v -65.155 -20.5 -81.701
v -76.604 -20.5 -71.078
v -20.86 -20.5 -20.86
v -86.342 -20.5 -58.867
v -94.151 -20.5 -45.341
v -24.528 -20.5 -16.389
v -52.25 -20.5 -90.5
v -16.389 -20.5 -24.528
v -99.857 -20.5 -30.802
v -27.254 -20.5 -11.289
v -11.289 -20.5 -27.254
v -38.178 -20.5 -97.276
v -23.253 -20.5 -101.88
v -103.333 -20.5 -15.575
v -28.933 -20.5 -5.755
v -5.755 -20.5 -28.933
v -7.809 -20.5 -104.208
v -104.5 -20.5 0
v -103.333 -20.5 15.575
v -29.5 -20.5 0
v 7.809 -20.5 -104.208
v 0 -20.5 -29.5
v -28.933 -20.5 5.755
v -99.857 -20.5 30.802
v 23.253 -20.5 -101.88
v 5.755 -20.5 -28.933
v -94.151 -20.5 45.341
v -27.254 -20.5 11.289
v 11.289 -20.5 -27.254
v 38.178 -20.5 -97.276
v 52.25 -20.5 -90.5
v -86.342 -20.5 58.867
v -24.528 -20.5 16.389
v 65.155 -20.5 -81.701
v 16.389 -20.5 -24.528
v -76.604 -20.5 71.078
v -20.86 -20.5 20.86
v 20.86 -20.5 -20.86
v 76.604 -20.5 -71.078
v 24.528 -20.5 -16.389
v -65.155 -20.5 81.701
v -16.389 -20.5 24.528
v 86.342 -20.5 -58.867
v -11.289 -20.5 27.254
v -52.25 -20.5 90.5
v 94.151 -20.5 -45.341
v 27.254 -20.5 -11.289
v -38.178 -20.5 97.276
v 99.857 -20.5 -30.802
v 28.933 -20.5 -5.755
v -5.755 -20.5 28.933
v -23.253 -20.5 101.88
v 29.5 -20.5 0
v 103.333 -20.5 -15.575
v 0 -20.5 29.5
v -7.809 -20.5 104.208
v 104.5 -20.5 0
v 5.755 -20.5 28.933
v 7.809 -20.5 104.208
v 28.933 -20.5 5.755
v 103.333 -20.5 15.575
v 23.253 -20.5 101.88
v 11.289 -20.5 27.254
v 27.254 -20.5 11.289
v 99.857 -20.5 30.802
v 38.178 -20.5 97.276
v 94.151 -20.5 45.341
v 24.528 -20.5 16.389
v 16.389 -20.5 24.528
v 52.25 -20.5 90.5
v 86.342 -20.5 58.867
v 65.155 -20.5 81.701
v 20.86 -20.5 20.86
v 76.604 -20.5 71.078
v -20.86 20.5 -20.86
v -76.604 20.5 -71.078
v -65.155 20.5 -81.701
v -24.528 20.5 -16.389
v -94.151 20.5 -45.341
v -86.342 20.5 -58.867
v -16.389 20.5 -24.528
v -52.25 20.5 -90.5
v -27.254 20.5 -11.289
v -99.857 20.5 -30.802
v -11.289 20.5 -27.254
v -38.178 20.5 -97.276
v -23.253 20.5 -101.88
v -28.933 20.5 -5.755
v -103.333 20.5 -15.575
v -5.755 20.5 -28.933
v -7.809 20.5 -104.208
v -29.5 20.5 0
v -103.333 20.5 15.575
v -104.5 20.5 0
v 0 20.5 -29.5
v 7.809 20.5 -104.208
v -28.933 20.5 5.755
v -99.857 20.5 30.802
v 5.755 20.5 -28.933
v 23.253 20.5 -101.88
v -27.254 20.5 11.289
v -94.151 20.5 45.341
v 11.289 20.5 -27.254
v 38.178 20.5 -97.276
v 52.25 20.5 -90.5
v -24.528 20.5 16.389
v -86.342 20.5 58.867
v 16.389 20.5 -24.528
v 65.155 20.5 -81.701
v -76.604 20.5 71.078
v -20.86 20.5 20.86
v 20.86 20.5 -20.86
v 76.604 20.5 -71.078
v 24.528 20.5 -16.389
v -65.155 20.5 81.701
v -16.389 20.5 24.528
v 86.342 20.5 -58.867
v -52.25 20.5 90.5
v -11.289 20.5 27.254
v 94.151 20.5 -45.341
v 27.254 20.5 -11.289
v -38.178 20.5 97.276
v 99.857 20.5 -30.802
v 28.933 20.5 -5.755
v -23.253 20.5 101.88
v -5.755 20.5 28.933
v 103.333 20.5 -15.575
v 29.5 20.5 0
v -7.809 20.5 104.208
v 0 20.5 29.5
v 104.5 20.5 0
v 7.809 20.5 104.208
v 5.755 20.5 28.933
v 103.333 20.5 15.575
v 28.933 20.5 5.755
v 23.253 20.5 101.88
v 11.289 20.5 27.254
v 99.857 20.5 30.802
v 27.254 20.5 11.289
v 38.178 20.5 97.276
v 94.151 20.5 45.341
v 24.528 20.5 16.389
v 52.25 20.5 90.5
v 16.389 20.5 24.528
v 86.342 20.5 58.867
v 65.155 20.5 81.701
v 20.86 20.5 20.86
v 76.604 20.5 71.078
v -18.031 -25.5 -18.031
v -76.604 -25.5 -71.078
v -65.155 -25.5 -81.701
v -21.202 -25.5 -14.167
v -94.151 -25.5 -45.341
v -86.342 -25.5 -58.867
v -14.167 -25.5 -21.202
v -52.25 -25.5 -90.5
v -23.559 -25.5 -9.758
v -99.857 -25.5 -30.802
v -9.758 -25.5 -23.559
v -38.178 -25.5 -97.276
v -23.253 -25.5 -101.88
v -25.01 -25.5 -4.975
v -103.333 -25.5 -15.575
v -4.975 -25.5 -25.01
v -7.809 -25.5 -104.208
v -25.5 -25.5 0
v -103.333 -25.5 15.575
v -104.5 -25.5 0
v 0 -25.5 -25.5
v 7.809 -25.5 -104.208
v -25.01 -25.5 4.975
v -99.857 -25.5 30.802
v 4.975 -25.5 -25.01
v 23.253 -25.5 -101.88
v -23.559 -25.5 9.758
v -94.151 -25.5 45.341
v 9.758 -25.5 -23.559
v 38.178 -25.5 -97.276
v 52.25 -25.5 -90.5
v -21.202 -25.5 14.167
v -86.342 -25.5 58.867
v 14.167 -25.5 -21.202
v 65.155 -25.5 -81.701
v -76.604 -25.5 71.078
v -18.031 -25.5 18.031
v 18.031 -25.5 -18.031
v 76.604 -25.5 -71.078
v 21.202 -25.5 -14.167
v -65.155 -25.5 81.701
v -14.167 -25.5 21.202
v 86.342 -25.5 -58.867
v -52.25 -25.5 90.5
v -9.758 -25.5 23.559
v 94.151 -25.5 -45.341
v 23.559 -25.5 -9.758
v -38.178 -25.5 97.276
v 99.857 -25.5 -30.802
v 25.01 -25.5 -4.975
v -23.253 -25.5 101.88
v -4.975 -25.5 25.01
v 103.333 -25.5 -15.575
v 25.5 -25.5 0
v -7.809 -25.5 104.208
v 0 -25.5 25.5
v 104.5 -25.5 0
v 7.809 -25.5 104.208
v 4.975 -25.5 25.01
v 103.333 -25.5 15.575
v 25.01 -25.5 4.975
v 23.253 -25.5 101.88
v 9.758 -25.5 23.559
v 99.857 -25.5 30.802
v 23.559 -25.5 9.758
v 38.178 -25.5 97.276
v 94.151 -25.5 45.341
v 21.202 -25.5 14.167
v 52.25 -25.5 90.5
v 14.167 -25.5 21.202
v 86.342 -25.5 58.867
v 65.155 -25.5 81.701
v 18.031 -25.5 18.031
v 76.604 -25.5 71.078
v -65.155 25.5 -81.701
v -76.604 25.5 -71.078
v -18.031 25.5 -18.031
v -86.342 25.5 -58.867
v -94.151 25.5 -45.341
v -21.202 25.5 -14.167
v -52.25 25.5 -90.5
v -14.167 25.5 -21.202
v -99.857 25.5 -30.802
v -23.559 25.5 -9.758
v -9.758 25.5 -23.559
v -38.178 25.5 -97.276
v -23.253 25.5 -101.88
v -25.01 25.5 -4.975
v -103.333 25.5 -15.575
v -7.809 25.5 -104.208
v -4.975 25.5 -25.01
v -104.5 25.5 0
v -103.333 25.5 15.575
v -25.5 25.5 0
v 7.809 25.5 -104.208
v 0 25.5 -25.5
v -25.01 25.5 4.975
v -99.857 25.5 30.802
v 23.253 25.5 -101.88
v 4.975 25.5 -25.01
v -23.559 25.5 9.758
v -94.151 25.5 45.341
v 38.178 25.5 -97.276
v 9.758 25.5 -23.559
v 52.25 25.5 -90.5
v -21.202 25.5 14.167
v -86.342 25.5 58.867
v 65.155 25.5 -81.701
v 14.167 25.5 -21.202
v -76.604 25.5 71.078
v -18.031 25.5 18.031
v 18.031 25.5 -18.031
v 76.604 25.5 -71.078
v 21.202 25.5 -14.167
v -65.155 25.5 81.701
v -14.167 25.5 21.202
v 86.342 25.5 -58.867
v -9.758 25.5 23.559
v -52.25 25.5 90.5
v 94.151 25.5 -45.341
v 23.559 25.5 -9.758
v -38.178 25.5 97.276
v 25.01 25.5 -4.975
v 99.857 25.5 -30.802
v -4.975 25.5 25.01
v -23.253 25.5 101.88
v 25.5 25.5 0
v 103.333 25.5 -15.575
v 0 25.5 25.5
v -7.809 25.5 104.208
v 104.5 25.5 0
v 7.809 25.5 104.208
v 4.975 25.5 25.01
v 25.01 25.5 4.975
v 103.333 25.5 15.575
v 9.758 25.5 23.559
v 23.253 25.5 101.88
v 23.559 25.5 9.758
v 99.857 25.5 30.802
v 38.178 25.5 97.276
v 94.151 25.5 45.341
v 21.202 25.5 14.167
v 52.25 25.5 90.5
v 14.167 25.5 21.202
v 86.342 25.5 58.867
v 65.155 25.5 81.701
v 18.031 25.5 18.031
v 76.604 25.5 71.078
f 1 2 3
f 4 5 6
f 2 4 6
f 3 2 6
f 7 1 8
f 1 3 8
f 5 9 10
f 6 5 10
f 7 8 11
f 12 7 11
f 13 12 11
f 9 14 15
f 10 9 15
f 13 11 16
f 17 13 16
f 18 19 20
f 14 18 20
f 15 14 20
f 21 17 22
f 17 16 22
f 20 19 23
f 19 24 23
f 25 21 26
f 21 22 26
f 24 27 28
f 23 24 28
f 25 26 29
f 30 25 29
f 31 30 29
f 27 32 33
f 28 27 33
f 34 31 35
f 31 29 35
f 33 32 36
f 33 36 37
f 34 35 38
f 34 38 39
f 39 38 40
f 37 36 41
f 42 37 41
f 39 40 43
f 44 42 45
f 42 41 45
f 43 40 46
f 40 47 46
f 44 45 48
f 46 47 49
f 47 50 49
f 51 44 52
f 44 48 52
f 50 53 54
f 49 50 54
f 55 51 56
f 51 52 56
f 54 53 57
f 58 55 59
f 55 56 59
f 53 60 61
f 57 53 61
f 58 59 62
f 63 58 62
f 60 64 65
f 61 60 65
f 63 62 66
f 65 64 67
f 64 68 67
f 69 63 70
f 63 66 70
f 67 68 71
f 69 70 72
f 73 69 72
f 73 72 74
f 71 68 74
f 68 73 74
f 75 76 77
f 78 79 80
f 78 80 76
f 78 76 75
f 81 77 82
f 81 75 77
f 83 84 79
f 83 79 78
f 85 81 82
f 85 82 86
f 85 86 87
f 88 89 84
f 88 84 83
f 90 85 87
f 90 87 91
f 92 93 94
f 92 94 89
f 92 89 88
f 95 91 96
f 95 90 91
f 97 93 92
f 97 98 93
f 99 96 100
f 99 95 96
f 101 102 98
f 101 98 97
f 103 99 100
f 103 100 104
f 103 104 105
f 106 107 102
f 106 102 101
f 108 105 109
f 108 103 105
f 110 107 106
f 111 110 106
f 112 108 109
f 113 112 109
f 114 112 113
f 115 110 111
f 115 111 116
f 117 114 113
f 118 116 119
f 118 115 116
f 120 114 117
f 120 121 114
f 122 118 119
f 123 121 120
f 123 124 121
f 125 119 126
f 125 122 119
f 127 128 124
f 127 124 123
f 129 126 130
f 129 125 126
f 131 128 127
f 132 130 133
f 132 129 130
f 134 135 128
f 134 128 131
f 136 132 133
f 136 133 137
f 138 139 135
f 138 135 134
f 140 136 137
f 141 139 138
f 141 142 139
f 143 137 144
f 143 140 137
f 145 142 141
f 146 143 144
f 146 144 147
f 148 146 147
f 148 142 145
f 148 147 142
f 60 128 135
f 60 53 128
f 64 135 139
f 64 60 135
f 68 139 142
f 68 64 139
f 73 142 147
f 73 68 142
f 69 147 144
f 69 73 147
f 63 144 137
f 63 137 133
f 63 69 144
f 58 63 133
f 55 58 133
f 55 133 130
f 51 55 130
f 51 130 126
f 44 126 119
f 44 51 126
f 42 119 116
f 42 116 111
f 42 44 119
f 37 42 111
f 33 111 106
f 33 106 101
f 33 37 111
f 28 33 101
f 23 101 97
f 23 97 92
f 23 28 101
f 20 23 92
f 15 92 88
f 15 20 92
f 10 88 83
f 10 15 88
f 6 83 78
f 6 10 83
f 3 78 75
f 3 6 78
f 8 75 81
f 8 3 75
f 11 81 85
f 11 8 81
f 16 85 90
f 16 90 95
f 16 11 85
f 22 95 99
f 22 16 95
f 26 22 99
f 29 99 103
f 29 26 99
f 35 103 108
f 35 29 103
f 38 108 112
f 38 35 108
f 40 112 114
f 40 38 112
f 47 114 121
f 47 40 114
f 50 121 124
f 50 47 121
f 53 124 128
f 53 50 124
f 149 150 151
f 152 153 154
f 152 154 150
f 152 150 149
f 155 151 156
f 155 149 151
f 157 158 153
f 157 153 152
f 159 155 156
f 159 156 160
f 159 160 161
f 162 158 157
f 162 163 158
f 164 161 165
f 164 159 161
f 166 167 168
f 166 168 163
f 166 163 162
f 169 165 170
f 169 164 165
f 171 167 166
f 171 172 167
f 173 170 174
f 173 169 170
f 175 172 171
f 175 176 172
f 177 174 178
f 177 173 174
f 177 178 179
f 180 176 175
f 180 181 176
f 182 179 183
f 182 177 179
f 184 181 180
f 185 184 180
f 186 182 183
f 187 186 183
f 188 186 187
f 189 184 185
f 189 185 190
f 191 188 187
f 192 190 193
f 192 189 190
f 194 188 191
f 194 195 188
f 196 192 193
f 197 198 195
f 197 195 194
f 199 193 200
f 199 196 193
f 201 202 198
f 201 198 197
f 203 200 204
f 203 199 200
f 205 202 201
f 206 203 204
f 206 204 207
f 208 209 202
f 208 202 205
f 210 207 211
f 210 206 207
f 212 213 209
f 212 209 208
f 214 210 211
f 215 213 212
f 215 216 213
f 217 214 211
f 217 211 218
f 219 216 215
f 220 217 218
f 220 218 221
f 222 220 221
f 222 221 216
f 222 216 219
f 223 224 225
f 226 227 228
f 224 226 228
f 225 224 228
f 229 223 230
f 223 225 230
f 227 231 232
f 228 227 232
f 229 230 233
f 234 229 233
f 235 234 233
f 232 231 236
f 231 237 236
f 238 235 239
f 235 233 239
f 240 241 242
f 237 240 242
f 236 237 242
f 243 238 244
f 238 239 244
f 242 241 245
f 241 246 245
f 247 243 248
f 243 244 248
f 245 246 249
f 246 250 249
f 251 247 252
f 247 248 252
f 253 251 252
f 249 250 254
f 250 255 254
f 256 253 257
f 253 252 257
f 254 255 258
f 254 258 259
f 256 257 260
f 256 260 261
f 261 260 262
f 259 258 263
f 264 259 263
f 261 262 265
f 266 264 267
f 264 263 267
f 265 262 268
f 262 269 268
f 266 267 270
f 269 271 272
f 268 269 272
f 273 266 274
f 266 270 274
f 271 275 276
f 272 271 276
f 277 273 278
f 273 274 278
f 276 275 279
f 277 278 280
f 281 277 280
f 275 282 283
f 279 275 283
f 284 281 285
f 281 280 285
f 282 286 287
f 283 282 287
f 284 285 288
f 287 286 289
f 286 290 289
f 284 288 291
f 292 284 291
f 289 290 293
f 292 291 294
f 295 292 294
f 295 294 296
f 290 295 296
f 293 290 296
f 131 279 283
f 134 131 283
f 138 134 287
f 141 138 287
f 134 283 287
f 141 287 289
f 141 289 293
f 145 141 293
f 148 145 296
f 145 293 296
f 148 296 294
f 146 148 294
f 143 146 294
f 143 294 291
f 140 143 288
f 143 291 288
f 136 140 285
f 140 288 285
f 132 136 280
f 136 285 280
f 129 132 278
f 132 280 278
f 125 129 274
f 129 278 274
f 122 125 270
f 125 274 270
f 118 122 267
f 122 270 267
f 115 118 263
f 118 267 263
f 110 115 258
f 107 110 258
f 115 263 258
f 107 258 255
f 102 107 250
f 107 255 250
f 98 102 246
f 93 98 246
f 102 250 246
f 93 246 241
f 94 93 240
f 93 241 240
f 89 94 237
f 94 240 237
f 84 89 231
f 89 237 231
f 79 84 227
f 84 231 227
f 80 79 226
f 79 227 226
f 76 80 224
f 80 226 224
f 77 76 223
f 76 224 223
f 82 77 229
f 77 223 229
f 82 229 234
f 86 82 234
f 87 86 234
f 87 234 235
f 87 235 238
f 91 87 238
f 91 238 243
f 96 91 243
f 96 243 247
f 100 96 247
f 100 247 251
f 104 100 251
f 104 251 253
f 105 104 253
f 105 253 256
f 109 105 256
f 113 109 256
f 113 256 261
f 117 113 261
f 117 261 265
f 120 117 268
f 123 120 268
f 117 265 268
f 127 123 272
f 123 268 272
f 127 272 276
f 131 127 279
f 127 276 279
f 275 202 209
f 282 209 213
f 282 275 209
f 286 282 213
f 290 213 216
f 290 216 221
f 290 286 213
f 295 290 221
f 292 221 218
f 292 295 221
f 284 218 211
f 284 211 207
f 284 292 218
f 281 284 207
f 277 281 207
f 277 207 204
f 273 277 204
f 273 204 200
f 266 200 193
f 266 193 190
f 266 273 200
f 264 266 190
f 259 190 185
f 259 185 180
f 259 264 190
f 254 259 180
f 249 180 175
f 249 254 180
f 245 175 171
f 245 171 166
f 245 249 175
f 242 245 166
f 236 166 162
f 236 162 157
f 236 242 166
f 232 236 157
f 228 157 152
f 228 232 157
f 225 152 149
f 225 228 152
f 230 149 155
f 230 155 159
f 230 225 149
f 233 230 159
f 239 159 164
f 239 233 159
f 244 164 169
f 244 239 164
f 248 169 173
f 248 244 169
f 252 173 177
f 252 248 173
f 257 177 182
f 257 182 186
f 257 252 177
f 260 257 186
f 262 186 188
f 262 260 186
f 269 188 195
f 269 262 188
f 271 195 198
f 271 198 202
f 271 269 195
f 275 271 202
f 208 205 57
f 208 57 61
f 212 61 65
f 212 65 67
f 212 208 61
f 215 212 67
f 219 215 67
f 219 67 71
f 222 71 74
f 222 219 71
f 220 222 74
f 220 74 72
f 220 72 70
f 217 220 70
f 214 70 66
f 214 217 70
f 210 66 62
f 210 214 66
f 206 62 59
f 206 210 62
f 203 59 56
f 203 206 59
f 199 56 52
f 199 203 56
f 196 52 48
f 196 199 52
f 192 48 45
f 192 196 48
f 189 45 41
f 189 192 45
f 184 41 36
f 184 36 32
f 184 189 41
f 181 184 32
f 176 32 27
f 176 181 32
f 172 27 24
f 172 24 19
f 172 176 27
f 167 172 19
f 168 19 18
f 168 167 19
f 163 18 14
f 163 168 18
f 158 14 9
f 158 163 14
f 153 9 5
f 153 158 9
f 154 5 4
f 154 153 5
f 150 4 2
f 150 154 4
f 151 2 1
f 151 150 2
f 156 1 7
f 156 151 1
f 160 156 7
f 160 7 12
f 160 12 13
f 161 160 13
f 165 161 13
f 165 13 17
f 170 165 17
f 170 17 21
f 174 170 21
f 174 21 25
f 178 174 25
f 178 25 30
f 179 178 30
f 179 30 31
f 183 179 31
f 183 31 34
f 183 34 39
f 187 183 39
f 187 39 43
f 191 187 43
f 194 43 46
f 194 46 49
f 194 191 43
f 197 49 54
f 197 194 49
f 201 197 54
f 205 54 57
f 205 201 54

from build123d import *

# Parameters (mm, degrees)
F0_R     = 29.5
F0_R_2   = 25.5
F1_DEPTH = 25.5
F2_R     = 104.5
F2_R_2   = 29.5
F3_DEPTH = 5


with BuildPart() as f1:
    # F0 (on Front) → F1 (new body, symmetric)
    with BuildSketch(Plane.XZ):
        Circle(F0_R)
        Circle(F0_R_2, mode=Mode.SUBTRACT)
    extrude(amount=F1_DEPTH, both=True)

    # F2 (on face) → F3 (join)
    with BuildSketch(Plane.XZ.offset(25.5)):
        Circle(F2_R)
        Circle(F2_R_2, mode=Mode.SUBTRACT)
    extrude(amount=-F3_DEPTH)

    # F4: F1 across plane


with BuildPart() as f1_1:
    add(f1.part)
    add(f1.part.mirror(Plane.XZ))


solid = f1_1.part
